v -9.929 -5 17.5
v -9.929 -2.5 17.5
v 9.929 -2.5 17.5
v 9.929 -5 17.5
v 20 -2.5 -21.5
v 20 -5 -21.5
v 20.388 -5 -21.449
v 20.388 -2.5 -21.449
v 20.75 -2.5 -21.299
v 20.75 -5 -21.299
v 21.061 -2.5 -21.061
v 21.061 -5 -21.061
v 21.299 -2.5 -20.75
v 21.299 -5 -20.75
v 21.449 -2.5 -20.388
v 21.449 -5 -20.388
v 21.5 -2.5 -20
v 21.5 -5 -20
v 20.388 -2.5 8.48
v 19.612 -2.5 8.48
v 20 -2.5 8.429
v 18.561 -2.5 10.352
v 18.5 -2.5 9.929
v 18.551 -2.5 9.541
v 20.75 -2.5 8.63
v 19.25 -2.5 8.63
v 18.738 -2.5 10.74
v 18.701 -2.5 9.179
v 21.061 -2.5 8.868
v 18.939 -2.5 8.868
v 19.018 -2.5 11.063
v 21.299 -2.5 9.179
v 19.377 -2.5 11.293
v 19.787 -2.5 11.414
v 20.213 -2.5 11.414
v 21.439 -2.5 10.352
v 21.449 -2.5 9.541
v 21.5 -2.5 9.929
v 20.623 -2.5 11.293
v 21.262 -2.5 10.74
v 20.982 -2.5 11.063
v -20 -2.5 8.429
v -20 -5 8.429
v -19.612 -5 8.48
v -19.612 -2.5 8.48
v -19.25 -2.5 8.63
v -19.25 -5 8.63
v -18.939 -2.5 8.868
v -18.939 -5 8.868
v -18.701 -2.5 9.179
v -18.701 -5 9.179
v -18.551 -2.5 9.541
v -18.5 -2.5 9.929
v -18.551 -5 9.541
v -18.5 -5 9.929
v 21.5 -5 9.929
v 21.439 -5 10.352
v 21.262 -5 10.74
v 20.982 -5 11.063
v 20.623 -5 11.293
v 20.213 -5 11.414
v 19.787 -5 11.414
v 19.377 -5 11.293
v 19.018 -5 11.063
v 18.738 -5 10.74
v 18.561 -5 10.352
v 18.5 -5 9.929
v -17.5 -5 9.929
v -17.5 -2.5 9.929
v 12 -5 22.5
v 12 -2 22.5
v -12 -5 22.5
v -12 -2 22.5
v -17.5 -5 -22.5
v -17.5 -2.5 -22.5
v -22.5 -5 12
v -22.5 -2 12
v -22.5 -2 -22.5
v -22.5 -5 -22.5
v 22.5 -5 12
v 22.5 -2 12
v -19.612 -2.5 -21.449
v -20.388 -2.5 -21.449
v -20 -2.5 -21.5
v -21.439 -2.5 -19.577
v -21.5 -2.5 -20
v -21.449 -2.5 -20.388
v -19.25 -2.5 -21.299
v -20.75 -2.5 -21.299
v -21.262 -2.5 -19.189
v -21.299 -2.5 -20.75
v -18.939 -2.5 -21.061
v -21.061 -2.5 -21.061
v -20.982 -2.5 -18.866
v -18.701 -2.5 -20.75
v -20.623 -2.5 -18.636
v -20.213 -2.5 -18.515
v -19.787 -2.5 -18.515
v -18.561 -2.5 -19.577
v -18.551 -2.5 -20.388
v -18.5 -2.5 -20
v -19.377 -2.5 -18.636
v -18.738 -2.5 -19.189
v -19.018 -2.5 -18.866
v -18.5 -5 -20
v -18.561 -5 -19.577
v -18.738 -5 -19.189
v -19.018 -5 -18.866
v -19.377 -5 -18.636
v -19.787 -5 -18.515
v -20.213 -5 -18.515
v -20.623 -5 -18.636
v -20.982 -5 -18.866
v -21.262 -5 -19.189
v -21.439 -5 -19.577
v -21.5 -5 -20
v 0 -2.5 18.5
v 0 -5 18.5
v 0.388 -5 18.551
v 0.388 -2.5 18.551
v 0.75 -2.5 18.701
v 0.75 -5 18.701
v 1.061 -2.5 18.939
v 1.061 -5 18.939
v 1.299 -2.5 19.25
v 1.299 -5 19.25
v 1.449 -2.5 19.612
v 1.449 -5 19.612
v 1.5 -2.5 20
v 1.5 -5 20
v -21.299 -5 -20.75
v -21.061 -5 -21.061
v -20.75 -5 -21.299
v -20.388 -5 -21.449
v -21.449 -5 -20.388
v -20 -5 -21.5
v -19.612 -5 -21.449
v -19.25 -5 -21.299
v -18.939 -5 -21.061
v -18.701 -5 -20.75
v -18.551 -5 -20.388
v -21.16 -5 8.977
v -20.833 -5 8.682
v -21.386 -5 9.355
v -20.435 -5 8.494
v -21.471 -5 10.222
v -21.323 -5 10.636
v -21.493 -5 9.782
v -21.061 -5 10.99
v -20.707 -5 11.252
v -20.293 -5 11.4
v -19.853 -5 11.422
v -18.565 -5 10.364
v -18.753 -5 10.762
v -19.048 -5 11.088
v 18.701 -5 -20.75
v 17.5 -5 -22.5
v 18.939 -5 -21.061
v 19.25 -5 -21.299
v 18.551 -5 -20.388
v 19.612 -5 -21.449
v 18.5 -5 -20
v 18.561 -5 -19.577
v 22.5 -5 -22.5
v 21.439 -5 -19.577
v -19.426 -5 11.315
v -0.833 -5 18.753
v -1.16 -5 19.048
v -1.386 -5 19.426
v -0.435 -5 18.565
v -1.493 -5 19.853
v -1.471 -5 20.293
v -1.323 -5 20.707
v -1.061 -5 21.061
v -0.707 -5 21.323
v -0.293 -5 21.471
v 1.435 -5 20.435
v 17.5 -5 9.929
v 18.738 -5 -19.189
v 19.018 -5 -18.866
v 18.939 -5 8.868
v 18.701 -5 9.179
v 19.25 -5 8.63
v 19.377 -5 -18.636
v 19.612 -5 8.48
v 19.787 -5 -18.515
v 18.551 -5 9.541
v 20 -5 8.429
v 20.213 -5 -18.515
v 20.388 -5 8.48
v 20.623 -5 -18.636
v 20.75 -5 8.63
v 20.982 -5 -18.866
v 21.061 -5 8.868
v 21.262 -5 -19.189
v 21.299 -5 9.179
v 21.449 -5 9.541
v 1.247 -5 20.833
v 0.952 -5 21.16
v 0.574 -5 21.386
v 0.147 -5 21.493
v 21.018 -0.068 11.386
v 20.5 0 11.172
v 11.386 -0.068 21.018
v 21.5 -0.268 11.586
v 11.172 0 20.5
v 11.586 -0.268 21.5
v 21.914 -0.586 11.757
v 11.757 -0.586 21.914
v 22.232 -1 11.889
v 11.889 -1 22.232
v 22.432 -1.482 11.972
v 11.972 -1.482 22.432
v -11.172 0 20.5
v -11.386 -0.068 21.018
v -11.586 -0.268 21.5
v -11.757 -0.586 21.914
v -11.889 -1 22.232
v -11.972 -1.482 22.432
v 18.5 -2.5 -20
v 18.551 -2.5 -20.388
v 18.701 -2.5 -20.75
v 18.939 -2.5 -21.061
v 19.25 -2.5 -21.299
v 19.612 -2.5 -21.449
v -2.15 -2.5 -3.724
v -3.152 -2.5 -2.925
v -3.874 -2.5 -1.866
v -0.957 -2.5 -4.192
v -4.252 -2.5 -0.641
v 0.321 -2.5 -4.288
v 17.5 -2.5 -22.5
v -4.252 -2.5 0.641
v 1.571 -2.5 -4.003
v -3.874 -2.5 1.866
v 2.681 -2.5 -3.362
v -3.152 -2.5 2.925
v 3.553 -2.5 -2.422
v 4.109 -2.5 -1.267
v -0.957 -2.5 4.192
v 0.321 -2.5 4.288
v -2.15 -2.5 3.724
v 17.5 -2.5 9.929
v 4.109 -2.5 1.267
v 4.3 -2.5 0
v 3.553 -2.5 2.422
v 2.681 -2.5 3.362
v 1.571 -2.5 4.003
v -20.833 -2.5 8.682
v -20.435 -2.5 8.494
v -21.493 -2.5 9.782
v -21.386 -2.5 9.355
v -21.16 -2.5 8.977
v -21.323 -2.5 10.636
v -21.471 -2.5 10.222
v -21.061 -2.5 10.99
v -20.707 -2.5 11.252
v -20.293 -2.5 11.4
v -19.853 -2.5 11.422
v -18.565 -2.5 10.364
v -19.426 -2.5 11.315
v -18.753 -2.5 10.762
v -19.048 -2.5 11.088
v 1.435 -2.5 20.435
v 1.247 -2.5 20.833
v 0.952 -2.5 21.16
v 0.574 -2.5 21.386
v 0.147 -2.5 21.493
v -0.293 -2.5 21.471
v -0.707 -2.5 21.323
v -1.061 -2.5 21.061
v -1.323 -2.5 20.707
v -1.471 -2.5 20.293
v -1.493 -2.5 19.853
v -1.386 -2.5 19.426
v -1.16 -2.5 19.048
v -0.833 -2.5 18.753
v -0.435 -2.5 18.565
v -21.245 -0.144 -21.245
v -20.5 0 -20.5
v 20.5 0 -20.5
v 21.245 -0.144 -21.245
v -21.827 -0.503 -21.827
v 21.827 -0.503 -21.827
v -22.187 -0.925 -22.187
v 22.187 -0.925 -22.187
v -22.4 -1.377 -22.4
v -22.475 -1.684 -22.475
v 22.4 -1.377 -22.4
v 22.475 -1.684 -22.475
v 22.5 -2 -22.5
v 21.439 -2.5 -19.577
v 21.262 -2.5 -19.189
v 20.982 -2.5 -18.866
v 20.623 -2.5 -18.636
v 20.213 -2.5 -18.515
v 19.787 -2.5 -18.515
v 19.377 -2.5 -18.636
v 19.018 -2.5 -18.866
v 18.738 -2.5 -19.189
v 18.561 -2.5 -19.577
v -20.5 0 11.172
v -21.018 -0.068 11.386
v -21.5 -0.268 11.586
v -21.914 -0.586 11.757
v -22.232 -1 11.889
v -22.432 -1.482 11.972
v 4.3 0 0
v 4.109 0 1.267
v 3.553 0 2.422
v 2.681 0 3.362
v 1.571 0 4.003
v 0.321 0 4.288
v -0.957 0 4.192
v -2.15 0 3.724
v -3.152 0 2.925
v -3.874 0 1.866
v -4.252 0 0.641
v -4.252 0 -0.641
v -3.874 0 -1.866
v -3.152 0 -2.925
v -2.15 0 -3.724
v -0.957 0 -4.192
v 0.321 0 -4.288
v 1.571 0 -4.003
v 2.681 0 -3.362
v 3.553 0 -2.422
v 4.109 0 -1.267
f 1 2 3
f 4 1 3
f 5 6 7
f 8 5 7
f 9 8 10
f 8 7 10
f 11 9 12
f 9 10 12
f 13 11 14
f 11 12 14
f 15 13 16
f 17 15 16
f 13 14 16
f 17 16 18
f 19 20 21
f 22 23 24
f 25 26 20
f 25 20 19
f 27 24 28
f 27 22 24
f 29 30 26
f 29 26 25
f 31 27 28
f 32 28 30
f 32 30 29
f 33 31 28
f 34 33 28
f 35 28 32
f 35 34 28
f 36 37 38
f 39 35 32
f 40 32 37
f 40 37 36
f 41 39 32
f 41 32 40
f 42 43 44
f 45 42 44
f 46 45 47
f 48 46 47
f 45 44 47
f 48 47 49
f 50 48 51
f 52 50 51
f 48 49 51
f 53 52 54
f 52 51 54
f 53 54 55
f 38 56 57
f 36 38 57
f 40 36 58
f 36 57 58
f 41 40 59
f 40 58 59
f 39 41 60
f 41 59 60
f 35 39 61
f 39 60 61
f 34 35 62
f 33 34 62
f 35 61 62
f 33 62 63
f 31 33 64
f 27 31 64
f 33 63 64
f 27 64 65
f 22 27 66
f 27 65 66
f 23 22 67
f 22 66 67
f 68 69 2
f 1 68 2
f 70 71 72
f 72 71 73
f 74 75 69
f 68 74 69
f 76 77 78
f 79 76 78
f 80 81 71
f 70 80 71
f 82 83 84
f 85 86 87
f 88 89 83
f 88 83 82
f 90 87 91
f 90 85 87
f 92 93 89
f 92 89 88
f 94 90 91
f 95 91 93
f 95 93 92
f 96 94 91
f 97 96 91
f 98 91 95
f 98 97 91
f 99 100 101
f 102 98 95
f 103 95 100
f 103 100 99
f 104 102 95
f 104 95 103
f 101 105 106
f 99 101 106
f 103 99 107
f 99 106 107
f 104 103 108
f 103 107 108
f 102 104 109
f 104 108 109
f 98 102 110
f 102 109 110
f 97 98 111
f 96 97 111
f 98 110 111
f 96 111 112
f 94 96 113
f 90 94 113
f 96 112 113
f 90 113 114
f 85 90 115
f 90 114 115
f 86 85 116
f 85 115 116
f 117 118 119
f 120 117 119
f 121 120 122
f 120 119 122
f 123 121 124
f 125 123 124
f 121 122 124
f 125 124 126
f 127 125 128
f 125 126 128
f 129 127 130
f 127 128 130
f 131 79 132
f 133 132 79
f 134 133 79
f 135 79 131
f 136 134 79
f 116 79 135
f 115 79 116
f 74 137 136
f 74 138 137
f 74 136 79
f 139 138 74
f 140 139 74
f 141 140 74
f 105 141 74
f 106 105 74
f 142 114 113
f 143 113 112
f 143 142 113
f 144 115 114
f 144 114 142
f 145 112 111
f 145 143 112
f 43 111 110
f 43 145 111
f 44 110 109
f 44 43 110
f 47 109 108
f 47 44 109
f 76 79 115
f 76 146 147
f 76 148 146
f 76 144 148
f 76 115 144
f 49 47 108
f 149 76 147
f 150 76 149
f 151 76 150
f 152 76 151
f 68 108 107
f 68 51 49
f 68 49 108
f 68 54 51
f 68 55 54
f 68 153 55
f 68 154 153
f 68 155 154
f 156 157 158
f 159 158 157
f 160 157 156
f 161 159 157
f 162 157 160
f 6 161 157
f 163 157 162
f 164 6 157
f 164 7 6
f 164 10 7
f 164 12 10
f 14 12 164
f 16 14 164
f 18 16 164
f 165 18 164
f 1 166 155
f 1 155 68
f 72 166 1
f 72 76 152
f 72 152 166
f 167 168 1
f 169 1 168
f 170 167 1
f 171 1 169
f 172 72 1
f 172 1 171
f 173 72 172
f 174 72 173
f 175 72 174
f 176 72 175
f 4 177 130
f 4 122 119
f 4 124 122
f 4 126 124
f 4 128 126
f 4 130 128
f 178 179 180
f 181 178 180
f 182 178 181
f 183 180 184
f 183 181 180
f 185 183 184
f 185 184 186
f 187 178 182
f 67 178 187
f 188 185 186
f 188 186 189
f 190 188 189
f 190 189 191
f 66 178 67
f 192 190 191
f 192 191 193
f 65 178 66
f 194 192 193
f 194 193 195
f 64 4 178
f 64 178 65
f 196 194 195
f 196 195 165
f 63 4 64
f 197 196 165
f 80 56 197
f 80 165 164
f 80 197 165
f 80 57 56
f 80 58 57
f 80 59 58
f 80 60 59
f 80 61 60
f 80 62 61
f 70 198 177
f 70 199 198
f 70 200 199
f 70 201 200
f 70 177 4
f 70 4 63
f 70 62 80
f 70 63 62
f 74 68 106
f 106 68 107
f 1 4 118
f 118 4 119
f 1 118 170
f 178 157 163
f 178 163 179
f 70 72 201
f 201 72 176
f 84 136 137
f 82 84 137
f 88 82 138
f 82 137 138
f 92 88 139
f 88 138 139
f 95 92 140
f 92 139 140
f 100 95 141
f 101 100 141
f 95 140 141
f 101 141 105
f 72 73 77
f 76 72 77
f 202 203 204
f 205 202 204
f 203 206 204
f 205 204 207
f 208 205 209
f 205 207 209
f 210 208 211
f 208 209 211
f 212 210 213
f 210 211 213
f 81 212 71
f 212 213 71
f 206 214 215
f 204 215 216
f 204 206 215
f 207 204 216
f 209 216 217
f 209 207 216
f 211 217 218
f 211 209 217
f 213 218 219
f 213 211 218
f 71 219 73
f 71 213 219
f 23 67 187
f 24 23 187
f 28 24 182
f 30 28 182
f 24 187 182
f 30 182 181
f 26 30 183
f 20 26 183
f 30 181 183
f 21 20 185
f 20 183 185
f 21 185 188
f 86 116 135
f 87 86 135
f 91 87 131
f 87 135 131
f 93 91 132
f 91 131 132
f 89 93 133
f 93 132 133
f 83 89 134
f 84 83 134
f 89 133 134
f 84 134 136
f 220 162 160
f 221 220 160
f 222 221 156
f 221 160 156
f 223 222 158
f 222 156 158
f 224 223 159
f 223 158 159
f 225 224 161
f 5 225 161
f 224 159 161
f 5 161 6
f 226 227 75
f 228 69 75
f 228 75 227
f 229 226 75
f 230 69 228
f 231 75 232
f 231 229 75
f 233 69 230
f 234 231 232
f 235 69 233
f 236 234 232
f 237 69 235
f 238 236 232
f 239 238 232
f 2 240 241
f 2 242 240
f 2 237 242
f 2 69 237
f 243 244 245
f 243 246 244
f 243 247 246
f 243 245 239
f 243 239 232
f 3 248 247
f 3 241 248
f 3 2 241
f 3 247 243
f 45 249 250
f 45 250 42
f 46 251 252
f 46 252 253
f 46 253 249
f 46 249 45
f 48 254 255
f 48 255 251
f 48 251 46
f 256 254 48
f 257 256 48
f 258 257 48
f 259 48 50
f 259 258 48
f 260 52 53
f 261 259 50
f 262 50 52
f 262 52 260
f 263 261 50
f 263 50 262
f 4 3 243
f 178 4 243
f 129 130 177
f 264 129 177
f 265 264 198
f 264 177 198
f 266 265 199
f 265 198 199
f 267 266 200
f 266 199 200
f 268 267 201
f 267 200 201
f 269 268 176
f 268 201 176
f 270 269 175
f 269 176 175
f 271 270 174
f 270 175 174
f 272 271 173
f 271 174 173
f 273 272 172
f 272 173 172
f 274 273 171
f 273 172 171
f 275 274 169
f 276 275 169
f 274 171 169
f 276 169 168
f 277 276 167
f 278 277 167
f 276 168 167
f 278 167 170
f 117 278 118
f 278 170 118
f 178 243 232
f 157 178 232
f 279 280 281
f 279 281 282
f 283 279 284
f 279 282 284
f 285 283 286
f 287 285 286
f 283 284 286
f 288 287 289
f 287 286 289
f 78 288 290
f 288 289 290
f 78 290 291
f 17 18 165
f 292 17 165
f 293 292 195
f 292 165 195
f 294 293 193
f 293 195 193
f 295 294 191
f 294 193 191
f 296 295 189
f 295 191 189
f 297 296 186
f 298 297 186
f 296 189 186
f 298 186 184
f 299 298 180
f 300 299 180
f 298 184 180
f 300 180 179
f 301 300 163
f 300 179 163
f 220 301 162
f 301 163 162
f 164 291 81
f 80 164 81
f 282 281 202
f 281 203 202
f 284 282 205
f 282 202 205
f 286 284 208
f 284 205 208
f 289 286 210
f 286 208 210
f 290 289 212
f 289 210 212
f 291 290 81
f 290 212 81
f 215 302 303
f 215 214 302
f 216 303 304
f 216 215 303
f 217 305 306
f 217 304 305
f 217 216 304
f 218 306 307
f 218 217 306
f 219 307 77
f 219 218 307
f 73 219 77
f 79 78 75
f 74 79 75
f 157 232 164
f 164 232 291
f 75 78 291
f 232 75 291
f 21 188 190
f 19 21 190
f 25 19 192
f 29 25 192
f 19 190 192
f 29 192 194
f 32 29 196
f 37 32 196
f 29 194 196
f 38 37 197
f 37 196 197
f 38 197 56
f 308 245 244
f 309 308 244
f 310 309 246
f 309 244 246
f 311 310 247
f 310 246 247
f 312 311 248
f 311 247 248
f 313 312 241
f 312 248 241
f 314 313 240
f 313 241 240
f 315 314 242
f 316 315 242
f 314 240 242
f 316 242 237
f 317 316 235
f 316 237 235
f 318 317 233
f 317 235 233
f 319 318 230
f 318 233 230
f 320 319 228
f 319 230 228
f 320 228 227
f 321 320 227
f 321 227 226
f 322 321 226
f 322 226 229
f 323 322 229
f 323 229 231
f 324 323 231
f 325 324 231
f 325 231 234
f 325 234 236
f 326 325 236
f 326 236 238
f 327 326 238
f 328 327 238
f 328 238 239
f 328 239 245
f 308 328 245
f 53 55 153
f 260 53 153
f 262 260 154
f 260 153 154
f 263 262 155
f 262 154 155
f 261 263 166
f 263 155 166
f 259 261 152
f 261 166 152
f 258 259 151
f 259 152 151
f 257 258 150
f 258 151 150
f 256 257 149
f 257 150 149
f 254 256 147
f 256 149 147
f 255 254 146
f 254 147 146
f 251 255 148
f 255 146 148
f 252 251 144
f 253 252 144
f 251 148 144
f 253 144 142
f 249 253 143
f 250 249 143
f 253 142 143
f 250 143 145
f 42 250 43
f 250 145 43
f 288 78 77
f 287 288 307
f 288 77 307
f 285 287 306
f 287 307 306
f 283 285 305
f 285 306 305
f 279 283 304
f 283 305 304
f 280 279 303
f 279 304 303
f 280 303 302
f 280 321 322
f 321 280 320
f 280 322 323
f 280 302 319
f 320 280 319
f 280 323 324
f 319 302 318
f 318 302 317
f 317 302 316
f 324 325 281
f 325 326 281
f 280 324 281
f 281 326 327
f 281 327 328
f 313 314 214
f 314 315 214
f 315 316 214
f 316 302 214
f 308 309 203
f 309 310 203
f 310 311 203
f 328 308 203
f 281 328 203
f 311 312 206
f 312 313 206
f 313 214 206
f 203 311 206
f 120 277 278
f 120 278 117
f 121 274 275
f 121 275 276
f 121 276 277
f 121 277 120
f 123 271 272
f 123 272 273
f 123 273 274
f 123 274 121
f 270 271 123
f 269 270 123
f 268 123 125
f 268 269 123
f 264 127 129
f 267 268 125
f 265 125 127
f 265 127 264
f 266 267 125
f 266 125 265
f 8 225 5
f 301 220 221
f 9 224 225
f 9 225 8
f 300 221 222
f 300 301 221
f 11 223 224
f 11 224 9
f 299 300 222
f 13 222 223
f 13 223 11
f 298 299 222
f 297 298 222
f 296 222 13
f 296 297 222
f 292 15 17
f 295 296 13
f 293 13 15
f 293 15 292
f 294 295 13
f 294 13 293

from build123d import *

# Parameters (mm, degrees)
F0_W     = 45
F0_H     = 45
F1_DEPTH = 2.5
F2_SIZE  = 10.5
F4_DEPTH = 2.5
F5_R     = 2
F3_R     = 4.3
F6_DEPTH = 25
F8_DEPTH = 2.5


with BuildPart() as f1:
    # F0 (on Front) → F1 (new body)
    with BuildSketch(Plane.XZ):
        Rectangle(F0_W, F0_H)
    extrude(amount=F1_DEPTH)

    # F2
    f2_edges = [f1.edges().sort_by_distance(p)[0] for p in [
        (-22.5, -1.25, 22.5),
        (22.5, -1.25, 22.5),
    ]]
    chamfer(f2_edges, length=F2_SIZE)

    # F3 (on face) → F4 (join)
    with BuildSketch(Plane.XZ.offset(2.5)):
        Polygon((-17.5, -22.5), (-17.5, 9.928932), (-9.928932, 17.5), (9.928932, 17.5), (17.5, 9.928932), (17.5, -22.5), (22.5, -22.5), (22.5, 12), (12, 22.5), (-12, 22.5), (-22.5, 12), (-22.5, -22.5), align=None)
    extrude(amount=F4_DEPTH)

    # F5
    f5_edges = [f1.edges().sort_by_distance(p)[0] for p in [
        (22.5, 0, -5.25),
        (17.25, 0, 17.25),
        (0, 0, -22.5),
        (0, 0, 22.5),
        (-22.5, 0, -5.25),
        (-17.25, 0, 17.25),
    ]]
    fillet(f5_edges, radius=F5_R)

    # F3 (on face) → F6 (cut)
    with BuildSketch(Plane.XZ.offset(2.5)):
        Circle(F3_R)
    extrude(amount=-F6_DEPTH, mode=Mode.SUBTRACT)

    # F7 (on face) → F8 (cut)
    with BuildSketch(Plane.XZ.offset(5)):
        with BuildLine():
            Line((20, -20), (18.5, -20))
            ThreePointArc((18.5, -20), (18.93934, -21.06066), (20, -21.5))
            Line((20, -21.5), (20, -20))
        make_face()
        with BuildLine():
            ThreePointArc((21.5, -20), (20, -18.5), (18.5, -20))
            Line((18.5, -20), (20, -20))
            Line((20, -20), (20, -21.5))
            ThreePointArc((20, -21.5), (21.06066, -21.06066), (21.5, -20))
        make_face()
        with BuildLine():
            ThreePointArc((-21.5, -20), (-21.06066, -21.06066), (-20, -21.5))
            Line((-20, -21.5), (-20, -20))
            Line((-20, -20), (-21.5, -20))
        make_face()
        with BuildLine():
            Line((-20, -20), (-20, -21.5))
            ThreePointArc((-20, -21.5), (-18.93934, -21.06066), (-18.5, -20))
            ThreePointArc((-18.5, -20), (-20, -18.5), (-21.5, -20))
            Line((-21.5, -20), (-20, -20))
        make_face()
        with BuildLine():
            ThreePointArc((-20, 8.428932), (-18.93934, 8.868272), (-18.5, 9.928932))
            Line((-18.5, 9.928932), (-20, 9.928932))
            Line((-20, 9.928932), (-20, 8.428932))
        make_face()
        with BuildLine():
            Line((-20, 9.928932), (-18.5, 9.928932))
            ThreePointArc((-18.5, 9.928932), (-21.06066, 10.989592), (-20, 8.428932))
            Line((-20, 8.428932), (-20, 9.928932))
        make_face()
        with BuildLine():
            ThreePointArc((1.5, 20), (-1.06066, 21.06066), (0, 18.5))
            ThreePointArc((0, 18.5), (1.06066, 18.93934), (1.5, 20))
        make_face()
        with BuildLine():
            Line((20, 9.928932), (18.5, 9.928932))
            ThreePointArc((18.5, 9.928932), (18.93934, 8.868272), (20, 8.428932))
            Line((20, 8.428932), (20, 9.928932))
        make_face()
        with BuildLine():
            ThreePointArc((21.5, 9.928932), (20, 11.428932), (18.5, 9.928932))
            Line((18.5, 9.928932), (20, 9.928932))
            Line((20, 9.928932), (20, 8.428932))
            ThreePointArc((20, 8.428932), (21.06066, 8.868272), (21.5, 9.928932))
        make_face()
    extrude(amount=-F8_DEPTH, mode=Mode.SUBTRACT)


solid = f1.part
